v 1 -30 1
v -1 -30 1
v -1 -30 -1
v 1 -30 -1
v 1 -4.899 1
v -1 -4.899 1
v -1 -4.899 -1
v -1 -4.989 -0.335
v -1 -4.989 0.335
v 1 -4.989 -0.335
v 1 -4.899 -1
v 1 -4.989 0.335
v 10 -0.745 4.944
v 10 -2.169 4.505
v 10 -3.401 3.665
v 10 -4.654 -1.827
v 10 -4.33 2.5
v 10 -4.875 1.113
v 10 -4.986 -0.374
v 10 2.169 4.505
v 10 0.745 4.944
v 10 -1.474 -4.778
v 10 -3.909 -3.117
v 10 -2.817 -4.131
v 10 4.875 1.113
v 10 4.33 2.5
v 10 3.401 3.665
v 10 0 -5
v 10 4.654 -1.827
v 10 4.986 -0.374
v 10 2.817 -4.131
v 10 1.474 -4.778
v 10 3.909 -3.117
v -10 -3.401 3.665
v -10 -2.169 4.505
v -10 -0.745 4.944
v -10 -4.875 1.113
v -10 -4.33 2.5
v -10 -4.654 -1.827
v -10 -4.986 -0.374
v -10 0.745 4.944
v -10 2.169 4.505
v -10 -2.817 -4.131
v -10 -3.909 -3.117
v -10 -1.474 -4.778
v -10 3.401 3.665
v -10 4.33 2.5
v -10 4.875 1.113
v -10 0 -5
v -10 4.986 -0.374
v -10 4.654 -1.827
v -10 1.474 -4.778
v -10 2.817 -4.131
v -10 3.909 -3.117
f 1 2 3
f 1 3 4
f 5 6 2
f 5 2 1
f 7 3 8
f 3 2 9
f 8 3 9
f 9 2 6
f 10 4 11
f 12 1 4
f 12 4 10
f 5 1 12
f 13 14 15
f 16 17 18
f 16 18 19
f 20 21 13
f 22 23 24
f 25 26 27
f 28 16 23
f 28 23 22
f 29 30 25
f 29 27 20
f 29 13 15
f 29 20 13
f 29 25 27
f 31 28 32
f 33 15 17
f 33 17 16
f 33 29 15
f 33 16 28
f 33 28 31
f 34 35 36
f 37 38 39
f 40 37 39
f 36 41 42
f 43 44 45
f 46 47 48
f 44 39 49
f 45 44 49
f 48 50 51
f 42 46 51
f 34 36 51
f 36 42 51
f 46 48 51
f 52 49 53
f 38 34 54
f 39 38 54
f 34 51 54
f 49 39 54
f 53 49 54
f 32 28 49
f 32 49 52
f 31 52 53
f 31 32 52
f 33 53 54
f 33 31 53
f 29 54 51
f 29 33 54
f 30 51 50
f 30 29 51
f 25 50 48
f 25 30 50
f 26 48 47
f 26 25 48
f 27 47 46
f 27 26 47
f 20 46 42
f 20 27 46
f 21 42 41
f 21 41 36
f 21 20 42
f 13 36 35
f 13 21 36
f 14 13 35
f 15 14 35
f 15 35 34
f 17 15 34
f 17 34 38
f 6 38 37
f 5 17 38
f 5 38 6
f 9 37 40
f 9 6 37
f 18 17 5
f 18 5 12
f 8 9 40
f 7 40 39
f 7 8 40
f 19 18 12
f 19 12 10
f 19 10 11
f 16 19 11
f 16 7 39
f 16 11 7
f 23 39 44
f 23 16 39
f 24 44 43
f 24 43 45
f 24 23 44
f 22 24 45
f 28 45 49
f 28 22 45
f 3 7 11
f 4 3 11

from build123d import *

# Parameters (mm, degrees)
SKETCH1_R           = 5
BOSS_EXTRUDE1_DEPTH = 10
SKETCH2_W           = 2
SKETCH2_H           = 30
BOSS_EXTRUDE2_DEPTH = 1


with BuildPart() as part:
    # Sketch1 → Boss-Extrude1 (new, symmetric)
    with BuildSketch(Plane(origin=(0, 0, 0), x_dir=(0, 0, -1), z_dir=(1, 0, 0))):
        Circle(SKETCH1_R)
    extrude(amount=BOSS_EXTRUDE1_DEPTH, both=True)

    # Sketch2 → Boss-Extrude2 (add, symmetric)
    with BuildSketch(Plane.XY):
        with Locations((0, -15)):
            Rectangle(SKETCH2_W, SKETCH2_H)
    extrude(amount=BOSS_EXTRUDE2_DEPTH, both=True)


solid = part.part
